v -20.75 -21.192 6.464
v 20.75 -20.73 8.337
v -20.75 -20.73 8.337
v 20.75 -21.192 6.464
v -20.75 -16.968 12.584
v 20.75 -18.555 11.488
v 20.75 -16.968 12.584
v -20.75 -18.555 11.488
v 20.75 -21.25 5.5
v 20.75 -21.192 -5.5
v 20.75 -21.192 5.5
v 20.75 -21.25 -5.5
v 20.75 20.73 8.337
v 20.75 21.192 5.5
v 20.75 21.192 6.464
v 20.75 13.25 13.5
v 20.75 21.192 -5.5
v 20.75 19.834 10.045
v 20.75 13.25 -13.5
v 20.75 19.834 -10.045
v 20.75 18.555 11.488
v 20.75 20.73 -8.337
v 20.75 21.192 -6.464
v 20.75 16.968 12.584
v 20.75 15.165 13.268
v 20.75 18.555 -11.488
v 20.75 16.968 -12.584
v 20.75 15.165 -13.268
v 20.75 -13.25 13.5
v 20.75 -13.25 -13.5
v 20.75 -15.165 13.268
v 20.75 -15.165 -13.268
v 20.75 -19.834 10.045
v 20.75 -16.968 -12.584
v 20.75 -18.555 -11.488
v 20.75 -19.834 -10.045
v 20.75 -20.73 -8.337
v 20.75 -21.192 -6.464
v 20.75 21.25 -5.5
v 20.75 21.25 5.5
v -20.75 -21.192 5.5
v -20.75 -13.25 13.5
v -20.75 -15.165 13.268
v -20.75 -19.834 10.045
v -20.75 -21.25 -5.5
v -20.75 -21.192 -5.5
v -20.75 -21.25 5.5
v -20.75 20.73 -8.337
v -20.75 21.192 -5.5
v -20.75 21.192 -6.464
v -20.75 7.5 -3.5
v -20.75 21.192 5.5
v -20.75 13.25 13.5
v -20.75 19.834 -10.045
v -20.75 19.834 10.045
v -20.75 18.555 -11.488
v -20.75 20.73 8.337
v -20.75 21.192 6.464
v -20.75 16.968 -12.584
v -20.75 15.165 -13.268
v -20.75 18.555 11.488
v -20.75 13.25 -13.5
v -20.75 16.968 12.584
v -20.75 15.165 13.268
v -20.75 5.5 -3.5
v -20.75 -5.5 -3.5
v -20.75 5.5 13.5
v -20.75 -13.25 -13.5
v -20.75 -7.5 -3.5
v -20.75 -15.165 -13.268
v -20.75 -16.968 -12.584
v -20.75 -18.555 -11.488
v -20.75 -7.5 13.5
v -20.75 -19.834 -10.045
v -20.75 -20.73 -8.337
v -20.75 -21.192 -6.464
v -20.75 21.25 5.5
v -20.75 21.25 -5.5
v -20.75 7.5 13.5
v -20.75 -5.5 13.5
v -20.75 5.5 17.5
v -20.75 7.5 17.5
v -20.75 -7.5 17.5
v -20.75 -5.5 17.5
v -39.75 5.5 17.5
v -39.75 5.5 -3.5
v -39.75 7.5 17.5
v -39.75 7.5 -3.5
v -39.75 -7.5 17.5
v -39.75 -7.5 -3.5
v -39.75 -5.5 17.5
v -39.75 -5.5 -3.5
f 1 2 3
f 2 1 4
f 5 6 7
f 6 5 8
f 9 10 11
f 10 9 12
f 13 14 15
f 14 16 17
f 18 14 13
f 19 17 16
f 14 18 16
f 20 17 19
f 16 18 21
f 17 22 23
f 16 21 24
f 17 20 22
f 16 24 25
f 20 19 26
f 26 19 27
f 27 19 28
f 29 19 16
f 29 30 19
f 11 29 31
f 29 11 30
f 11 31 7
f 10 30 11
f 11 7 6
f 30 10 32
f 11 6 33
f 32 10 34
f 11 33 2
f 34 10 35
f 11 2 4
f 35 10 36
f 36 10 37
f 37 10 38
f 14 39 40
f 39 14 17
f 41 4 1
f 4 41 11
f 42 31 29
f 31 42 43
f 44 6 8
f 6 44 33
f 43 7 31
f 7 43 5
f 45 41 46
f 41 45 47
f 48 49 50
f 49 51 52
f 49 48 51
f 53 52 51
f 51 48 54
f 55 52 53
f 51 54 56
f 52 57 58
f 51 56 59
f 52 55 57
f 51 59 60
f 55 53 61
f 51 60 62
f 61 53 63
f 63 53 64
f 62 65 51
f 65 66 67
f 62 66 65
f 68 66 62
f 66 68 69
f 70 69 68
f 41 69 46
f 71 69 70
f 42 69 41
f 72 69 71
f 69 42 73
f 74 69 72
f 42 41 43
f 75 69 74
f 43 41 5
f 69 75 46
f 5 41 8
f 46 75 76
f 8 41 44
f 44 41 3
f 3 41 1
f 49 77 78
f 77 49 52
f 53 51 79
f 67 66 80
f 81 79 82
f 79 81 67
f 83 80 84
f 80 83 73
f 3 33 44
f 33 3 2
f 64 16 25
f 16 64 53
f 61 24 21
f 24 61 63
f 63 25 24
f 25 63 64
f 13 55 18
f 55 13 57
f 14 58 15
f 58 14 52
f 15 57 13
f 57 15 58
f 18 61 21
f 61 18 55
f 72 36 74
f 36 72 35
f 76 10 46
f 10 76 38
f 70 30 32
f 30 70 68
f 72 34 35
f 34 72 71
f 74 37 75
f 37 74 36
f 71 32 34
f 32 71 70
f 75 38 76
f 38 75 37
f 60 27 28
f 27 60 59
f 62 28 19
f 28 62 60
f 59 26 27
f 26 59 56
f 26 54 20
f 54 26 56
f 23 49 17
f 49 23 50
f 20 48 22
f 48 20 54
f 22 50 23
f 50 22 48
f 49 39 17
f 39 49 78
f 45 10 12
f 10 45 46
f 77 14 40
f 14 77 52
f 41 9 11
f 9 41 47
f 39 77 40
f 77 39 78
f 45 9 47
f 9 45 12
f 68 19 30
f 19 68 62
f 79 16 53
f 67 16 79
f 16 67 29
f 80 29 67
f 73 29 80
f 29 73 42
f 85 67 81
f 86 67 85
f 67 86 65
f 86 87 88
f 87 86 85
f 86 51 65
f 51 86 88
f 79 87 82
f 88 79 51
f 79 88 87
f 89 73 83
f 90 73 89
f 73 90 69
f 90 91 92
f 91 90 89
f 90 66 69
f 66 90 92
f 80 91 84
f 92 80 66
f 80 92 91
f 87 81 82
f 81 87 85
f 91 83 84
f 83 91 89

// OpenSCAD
// Library: twentyWUSBCBlock.scad
// Version: 1.0.0
// Author: David Bowers
// Copyright: 2022
// License: 2-clause BSD License (http://opensource.org/licenses/BSD-2-Clause)

// twenty_charger_block(length, width, height, edge_radius);

// EXAMPLE USAGE:
// twenty_charger_block();

include <MCAD/boxes.scad>

block_length = 41.5;
block_edge_rad = 8;

function get_block_length() = block_length;
function get_block_edge_rad() = block_edge_rad;

module prong(
    length = 19,
    width = 7,
    thickness = 2
    )
    {
        translate([-length/2,0,0])
        rotate([0,0,90])        
        cube([thickness, length, width], center = true);
    }

module twenty_charger_block(
    length = block_length, 
    width = 42.5,
    height = 27, 
    edge_radius = block_edge_rad)
{
    rotate([0,90,0])
    roundedBox(
        size=[ height, width, length],
        radius=edge_radius,
        sidesonly=true
    );
    for (z = [0 : 2]){
        for (i = [1, -1]){
        translate([-length/2, i*6.5, z*7])
        prong();
        }
    }

}

twenty_charger_block();
